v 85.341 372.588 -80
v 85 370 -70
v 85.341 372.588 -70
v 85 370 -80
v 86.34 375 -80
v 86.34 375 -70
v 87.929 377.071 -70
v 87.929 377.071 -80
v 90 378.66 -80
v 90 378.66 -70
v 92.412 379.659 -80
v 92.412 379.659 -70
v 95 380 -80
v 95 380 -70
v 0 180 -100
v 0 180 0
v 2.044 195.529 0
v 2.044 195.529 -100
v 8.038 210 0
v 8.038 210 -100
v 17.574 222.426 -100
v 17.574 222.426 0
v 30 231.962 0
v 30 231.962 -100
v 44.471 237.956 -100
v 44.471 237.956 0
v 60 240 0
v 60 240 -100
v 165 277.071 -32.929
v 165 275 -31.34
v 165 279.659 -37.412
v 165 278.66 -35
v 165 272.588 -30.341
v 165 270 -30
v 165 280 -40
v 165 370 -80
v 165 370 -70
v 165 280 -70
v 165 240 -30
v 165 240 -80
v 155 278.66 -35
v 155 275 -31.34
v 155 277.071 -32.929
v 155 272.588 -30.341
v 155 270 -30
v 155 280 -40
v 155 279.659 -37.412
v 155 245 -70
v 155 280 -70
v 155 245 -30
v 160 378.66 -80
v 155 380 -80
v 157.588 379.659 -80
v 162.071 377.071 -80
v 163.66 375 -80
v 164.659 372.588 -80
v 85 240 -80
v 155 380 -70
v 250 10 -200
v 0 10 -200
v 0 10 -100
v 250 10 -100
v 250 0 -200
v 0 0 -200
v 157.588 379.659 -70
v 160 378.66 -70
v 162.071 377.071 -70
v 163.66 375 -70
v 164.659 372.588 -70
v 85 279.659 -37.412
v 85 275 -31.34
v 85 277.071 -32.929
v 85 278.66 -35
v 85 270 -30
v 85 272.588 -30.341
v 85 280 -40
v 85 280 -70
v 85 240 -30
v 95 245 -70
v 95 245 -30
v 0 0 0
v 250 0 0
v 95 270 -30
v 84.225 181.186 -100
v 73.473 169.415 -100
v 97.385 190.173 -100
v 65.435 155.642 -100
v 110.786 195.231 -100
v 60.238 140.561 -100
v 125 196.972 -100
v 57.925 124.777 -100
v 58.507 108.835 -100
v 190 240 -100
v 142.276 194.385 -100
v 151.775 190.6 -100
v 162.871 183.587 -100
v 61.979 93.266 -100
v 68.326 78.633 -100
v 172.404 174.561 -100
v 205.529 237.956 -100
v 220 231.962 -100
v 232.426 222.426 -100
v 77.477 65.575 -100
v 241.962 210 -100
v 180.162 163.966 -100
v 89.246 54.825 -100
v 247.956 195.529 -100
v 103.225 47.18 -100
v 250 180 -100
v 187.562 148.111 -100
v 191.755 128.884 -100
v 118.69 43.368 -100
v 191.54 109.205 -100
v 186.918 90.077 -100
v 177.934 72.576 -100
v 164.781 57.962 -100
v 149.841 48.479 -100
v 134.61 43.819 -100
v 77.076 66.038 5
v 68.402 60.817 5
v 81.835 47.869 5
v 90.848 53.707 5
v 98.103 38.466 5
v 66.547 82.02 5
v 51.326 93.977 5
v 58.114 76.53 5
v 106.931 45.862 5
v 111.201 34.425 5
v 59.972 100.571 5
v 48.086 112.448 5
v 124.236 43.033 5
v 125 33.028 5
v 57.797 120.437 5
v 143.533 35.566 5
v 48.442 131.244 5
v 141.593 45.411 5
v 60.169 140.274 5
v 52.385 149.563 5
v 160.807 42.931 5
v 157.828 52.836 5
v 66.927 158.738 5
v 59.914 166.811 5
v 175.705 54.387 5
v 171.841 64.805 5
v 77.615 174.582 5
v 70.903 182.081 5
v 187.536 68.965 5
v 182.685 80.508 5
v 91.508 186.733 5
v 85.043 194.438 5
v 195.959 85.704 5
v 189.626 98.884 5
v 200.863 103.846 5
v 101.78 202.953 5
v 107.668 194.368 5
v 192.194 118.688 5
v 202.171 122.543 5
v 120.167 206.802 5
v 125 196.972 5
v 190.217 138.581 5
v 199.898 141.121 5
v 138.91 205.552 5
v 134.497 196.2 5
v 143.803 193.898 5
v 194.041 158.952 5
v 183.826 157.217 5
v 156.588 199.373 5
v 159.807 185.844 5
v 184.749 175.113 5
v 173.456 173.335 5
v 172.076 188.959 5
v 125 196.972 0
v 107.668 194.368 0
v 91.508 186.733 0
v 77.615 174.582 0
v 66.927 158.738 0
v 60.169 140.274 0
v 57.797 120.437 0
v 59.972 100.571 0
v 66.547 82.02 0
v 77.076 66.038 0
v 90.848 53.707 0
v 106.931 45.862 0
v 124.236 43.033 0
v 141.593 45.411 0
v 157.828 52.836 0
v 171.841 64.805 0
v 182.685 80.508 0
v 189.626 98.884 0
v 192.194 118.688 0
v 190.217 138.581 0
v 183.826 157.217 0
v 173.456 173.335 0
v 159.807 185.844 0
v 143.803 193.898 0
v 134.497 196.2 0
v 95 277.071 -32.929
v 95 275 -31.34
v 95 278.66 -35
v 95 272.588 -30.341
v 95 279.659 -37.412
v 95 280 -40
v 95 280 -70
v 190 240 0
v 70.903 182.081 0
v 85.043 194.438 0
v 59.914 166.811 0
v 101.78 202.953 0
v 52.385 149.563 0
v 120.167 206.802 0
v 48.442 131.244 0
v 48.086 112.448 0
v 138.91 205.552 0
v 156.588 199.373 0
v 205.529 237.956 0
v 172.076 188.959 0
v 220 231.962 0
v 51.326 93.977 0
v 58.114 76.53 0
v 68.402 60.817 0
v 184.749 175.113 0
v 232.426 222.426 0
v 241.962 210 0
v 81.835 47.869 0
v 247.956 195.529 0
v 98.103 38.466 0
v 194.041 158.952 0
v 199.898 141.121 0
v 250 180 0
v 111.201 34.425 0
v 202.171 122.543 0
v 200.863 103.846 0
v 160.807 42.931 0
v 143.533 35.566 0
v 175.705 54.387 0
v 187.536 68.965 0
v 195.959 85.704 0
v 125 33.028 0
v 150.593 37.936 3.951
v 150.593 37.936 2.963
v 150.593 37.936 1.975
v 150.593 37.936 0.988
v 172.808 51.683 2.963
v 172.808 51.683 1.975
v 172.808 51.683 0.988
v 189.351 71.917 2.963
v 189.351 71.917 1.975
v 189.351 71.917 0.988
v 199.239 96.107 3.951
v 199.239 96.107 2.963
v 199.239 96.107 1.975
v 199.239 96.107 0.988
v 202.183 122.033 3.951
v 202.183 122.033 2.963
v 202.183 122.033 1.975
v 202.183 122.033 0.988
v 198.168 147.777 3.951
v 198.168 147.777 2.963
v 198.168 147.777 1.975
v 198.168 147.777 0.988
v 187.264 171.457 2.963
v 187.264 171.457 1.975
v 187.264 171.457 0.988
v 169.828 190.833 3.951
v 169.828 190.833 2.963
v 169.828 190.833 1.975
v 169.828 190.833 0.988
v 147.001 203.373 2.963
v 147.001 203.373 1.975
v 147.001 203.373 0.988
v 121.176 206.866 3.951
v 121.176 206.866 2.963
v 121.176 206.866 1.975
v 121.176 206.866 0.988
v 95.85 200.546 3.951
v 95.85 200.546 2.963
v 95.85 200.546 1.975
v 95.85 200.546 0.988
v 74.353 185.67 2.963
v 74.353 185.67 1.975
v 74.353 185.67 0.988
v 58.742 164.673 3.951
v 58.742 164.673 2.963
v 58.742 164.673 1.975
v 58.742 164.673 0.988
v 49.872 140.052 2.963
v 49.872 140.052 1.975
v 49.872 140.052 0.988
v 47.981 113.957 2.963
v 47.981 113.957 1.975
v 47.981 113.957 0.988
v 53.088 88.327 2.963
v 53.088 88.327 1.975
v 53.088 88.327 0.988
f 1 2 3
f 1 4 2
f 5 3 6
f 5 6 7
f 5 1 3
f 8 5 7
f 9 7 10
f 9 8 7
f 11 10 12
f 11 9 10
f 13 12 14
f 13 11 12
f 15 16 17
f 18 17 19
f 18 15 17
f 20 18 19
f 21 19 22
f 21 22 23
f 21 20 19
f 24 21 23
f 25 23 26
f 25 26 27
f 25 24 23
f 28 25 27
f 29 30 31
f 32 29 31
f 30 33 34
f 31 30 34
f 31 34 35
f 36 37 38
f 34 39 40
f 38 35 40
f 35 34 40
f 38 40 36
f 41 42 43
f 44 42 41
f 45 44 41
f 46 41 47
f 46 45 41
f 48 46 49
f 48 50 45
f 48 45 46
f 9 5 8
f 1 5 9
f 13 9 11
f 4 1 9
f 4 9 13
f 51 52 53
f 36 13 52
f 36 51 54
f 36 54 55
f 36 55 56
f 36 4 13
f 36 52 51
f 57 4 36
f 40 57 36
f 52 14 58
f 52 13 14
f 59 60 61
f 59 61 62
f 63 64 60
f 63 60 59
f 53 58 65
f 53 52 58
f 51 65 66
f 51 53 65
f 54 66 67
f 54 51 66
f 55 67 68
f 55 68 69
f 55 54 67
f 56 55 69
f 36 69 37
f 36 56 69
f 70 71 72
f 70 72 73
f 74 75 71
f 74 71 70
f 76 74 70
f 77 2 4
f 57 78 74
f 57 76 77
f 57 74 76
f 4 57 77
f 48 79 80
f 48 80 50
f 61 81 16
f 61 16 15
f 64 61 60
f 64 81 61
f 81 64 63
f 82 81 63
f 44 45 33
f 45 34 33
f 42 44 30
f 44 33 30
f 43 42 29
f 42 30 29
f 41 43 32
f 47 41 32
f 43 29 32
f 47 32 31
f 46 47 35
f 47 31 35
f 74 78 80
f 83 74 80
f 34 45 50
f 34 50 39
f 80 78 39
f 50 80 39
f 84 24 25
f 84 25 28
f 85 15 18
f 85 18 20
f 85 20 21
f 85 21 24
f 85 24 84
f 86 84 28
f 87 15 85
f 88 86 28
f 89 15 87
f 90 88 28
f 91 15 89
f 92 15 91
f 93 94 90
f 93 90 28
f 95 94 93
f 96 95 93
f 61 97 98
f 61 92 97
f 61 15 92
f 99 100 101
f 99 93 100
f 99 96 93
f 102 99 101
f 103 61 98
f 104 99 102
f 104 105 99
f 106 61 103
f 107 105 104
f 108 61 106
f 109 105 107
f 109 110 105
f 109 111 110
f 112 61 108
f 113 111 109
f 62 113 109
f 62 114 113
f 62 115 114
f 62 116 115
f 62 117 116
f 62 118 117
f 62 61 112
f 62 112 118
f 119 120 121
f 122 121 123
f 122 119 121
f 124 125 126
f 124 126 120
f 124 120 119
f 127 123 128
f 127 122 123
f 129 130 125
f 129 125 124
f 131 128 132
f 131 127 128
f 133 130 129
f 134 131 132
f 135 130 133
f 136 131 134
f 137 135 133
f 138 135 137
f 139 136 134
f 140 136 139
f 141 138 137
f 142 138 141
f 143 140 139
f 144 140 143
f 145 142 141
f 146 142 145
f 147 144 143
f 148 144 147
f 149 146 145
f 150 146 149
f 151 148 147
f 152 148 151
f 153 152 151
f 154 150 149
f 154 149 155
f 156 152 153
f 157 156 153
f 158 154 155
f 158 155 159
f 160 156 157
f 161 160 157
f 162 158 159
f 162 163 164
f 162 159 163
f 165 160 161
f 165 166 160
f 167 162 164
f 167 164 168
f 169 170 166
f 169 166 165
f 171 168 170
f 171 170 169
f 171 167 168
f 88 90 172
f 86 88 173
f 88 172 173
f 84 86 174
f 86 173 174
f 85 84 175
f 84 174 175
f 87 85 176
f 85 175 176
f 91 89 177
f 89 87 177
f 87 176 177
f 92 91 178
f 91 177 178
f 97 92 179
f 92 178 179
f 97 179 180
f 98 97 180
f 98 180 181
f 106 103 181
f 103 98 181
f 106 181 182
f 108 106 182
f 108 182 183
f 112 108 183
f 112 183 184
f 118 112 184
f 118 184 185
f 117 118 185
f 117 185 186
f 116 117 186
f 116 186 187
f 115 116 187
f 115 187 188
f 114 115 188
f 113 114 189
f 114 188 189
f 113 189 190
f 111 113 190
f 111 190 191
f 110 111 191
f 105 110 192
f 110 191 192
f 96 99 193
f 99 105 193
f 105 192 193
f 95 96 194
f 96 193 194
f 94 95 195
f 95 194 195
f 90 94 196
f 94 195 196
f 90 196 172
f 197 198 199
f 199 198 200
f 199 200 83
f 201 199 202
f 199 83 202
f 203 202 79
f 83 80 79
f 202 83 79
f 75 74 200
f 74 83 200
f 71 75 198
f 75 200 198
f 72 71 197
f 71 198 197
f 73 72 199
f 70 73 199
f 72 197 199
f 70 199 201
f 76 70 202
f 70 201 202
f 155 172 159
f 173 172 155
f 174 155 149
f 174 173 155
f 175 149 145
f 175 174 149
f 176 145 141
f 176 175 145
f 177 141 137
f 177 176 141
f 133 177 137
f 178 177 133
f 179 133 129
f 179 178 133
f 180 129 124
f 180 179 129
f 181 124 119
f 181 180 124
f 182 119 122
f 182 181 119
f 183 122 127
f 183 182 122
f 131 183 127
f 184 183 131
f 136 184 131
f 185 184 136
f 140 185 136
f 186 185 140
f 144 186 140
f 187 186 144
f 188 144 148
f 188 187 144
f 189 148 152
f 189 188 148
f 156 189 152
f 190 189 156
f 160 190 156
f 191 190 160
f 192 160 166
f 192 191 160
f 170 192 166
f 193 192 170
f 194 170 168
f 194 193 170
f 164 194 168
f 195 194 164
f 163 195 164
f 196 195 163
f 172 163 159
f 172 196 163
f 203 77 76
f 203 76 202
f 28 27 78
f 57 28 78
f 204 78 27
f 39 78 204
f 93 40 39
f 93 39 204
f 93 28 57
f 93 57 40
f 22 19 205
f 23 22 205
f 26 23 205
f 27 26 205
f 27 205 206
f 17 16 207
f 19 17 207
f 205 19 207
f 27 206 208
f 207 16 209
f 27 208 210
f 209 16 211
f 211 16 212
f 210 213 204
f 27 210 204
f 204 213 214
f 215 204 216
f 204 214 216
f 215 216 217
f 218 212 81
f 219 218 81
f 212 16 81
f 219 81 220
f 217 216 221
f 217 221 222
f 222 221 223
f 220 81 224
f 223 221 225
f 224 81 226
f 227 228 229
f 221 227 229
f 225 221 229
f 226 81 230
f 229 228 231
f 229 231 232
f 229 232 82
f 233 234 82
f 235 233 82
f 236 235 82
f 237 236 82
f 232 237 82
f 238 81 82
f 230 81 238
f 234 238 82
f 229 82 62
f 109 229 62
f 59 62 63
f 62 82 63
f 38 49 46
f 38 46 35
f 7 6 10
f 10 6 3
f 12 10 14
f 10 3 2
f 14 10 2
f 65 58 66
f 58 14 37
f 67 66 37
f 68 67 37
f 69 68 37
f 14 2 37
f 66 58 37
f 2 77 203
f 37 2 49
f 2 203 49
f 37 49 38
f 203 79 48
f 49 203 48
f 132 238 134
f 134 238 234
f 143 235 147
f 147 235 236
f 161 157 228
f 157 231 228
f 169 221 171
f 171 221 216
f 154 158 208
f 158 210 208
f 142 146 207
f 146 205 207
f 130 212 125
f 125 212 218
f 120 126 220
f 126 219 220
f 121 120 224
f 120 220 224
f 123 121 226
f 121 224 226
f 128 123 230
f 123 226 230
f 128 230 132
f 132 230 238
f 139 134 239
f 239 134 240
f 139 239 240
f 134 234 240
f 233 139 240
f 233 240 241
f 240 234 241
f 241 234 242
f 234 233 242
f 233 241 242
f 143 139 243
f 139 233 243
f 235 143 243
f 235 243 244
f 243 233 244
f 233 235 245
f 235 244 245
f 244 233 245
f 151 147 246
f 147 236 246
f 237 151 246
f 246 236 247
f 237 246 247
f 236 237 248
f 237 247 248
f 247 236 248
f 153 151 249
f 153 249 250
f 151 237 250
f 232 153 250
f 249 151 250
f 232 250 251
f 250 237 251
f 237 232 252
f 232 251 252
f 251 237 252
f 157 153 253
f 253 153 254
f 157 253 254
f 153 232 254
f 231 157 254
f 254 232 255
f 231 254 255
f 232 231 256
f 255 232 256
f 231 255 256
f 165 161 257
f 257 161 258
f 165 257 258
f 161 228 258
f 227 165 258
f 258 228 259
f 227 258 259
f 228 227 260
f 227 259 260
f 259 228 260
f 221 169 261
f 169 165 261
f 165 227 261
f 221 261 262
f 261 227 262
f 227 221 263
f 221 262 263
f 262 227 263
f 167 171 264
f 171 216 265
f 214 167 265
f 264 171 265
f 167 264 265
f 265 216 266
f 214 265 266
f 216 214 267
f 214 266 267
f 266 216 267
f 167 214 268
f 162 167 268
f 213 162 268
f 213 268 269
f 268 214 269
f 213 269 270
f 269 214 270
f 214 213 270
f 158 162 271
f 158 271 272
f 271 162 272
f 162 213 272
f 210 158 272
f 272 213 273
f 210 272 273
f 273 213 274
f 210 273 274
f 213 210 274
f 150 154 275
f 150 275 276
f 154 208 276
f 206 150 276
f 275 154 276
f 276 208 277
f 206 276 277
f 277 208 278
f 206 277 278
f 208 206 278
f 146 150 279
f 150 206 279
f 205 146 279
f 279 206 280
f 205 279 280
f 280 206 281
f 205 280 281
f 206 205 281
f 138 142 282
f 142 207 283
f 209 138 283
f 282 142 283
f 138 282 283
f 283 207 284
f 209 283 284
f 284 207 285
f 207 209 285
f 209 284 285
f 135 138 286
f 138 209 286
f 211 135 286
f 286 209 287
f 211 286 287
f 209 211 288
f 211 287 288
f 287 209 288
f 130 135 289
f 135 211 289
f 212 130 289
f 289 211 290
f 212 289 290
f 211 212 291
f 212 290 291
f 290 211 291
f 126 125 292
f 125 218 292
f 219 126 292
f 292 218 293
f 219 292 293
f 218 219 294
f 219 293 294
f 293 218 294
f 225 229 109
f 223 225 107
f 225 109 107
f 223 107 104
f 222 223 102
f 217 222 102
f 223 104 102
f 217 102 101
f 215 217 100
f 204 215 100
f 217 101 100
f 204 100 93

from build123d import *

# Parameters (mm, degrees)
CROQUIS1_W              = 250
CROQUIS1_H              = 100
SALIENTE_EXTRUIR1_DEPTH = 240
CROQUIS1_3_W            = 250
CROQUIS1_3_H            = 100
SALIENTE_EXTRUIR2_DEPTH = 10
REDONDEO2_R             = 60
CROQUIS7_RX             = 76.972297538
CROQUIS7_RY             = 67.204239475
CORTAR_EXTRUIR4_DEPTH   = 143
CROQUIS8_RX             = 76.972297538
CROQUIS8_RY             = 67.204239475
SALIENTE_EXTRUIR3_DEPTH = 5
SALIENTE_EXTRUIR4_DEPTH = 140
CROQUIS10_4_W           = 60
CROQUIS10_4_H           = 40
SALIENTE_EXTRUIR5_DEPTH = 5
CROQUIS10_7_W           = 10
CROQUIS10_7_H           = 40
SALIENTE_EXTRUIR6_DEPTH = 40
REDONDEO3_R             = 10


with BuildPart() as part:
    # Croquis1 → Saliente-Extruir1 (new body)
    with BuildSketch(Plane(origin=(0, 0, 0), x_dir=(1, 0, 0), z_dir=(0, 1, 0))):
        with Locations((125, 50)):
            Rectangle(CROQUIS1_W, CROQUIS1_H)
    extrude(amount=SALIENTE_EXTRUIR1_DEPTH)

    # Croquis1<3> → Saliente-Extruir2 (add)
    with BuildSketch(Plane(origin=(0, 0, 0), x_dir=(1, 0, 0), z_dir=(0, 1, 0))):
        with Locations((125, 150)):
            Rectangle(CROQUIS1_3_W, CROQUIS1_3_H)
    extrude(amount=SALIENTE_EXTRUIR2_DEPTH)

    # Redondeo2
    redondeo2_edges = [part.edges().sort_by_distance(p)[0] for p in [
        (0, 240, -50),
        (250, 240, -50),
    ]]
    fillet(redondeo2_edges, radius=REDONDEO2_R)

    # Croquis7 → Cortar-Extruir4 (cut)
    with BuildSketch(Plane.XY):
        with Locations(Location((125, 120), (0, 0, 90))):
            Ellipse(CROQUIS7_RX, CROQUIS7_RY)
    extrude(amount=-CORTAR_EXTRUIR4_DEPTH, mode=Mode.SUBTRACT)

    # Croquis8 → Saliente-Extruir3 (add)
    with BuildSketch(Plane.XY):
        with BuildLine():
            add(Edge.make_bspline(
                [(125, 33.027702462), (127.716922997, 33.027702462), (130.404614336, 33.188438016), (135.724227666, 33.816566957), (138.356140016, 34.284013351), (143.564938997, 35.521474998), (146.141826175, 36.291487238), (149.32789788, 37.44666128), (149.963373673, 37.687404872), (151.222655871, 38.185011316), (151.847502015, 38.442239729), (153.70789977, 39.238771481), (154.929321189, 39.80290291), (158.538604748, 41.591903506), (160.871628277, 42.913129324), (165.395861295, 45.804761696), (167.58815404, 47.376066564), (171.826538699, 50.764218527), (173.840461698, 52.555062734), (177.671334874, 56.317817281), (179.488232347, 58.289776068), (182.931848653, 62.408514262), (184.558548159, 64.555311436), (186.856901598, 67.905760262), (187.596747198, 69.04071402), (189.017296342, 71.333449758), (189.6993083, 72.493124445), (192.971944449, 78.356200717), (195.154024171, 83.251956302), (197.358832322, 89.617795434), (197.773446154, 90.903439911), (198.549527035, 93.499465527), (198.90845874, 94.801347136), (199.900213511, 98.718294557), (200.448185039, 101.344637868), (201.763342829, 109.267362405), (202.204539447, 114.607070459), (202.204164292, 121.355053919), (202.176088659, 122.711265866), (202.064301478, 125.410452751), (201.980723301, 126.754629699), (201.648104971, 130.771139961), (201.317354659, 133.427486666), (200.000943496, 141.333104769), (198.694169349, 146.519550286), (196.490505918, 152.89104827), (196.019747164, 154.162853647), (195.025553036, 156.678150817), (194.502863938, 157.920234824), (192.858566532, 161.600125171), (191.660898436, 163.991673425), (187.761672007, 170.980079827), (184.75725411, 175.392744669), (180.875974654, 180.052106022), (180.437687128, 180.565534743), (179.546751621, 181.583658434), (179.09337423, 182.089135096), (177.717535309, 183.585353779), (176.779803074, 184.555633176), (173.905444326, 187.385345487), (171.907805387, 189.163850968), (167.748045081, 192.502690959), (165.585944795, 194.06305343), (161.090554052, 196.95671019), (158.757317239, 198.290075632), (155.72577479, 199.804250133), (155.112808717, 200.099822067), (153.88335661, 200.671549412), (153.266110917, 200.948114377), (151.406864587, 201.750096433), (150.157359681, 202.247819081), (146.379036893, 203.630980583), (143.820490433, 204.406706354), (138.623300542, 205.662560658), (135.98466882, 206.142732406), (132.634166248, 206.550255722), (131.96144789, 206.622099252), (130.610691005, 206.746152274), (129.93172719, 206.798392098), (127.900475049, 206.924426335), (126.55019563, 206.968001148), (122.510773219, 206.97998383), (119.833015326, 206.829969745), (114.507334656, 206.219611994), (111.859412215, 205.759264851), (107.910237087, 204.832541616), (106.593459447, 204.482838697), (103.994656921, 203.711410555), (102.711704261, 203.289784981), (98.91073308, 201.920359147), (96.440473583, 200.868288733), (91.623019608, 198.495465534), (89.275838057, 197.174684523), (85.847080779, 194.992620648), (84.71874619, 194.230876818), (82.517429794, 192.658127473), (81.441211058, 191.845169128), (78.283535549, 189.32908586), (76.27287878, 187.548949253), (72.432879578, 183.791453982), (70.603560889, 181.814069491), (67.99406522, 178.7017115), (67.145842384, 177.638458972), (65.509882594, 175.484104304), (64.72007818, 174.390671655), (62.432585129, 171.063111394), (61.016620532, 168.781834632), (58.394106502, 164.098462965), (57.187582612, 161.696353323), (55.532932124, 158.003686436), (55.007282323, 156.757854747), (54.007986074, 154.236189011), (53.536955939, 152.966840124), (51.326504906, 146.593244825), (50.011292376, 141.394042449), (48.68568488, 133.451947581), (48.35242998, 130.780535642), (48.017922664, 126.736804027), (47.934071147, 125.381056898), (47.82305979, 122.680583454), (47.7956054, 121.333200704), (47.79638432, 114.610332415), (48.235235275, 109.276623608), (49.552019564, 101.343057777), (50.101380969, 98.70977145), (51.097892129, 94.777389169), (51.459613379, 93.467418163), (52.234572443, 90.878122589), (52.64839956, 89.596085706), (54.84833069, 83.248504751), (57.023259968, 78.369066466), (60.932315801, 71.359424739), (62.343788817, 69.074787684), (64.633950857, 65.730613408), (65.428738625, 64.626504273), (67.06308957, 62.467122017), (67.902663487, 61.411404642), (70.488298836, 58.315872226), (72.301112731, 56.347504426), (76.107190252, 52.603909795), (78.100429201, 50.828656551), (82.275122661, 47.479603046), (84.456517338, 45.90573874), (87.309903664, 44.073958286), (87.887913061, 43.71382706), (89.049899878, 43.011672104), (89.634271423, 42.669355361), (91.39746439, 41.668541908), (92.5863576, 41.036165001), (96.193121975, 39.24298859), (98.65097198, 38.185868736), (103.674761223, 36.35194367), (106.240682844, 35.57509277), (110.174376905, 34.629763782), (111.499773132, 34.351388781), (114.179927084, 33.870783809), (115.524400715, 33.670430265), (118.219575281, 33.349651967), (119.570693495, 33.229152241), (121.602683565, 33.108421489), (122.280899507, 33.078186262), (123.639111575, 33.03782677), (124.320769251, 33.027702462), (125, 33.027702462)],
                knots=[0, 0, 0, 0, 0.015625, 0.015625, 0.03125, 0.03125, 0.046875, 0.046875, 0.05078125, 0.05078125, 0.0546875, 0.0546875, 0.0625, 0.0625, 0.078125, 0.078125, 0.09375, 0.09375, 0.109375, 0.109375, 0.125, 0.125, 0.140625, 0.140625, 0.1484375, 0.1484375, 0.15625, 0.15625, 0.1875, 0.1875, 0.1953125, 0.1953125, 0.203125, 0.203125, 0.21875, 0.21875, 0.25, 0.25, 0.2578125, 0.2578125, 0.265625, 0.265625, 0.28125, 0.28125, 0.3125, 0.3125, 0.3203125, 0.3203125, 0.328125, 0.328125, 0.34375, 0.34375, 0.375, 0.375, 0.37890625, 0.37890625, 0.3828125, 0.3828125, 0.390625, 0.390625, 0.40625, 0.40625, 0.421875, 0.421875, 0.4375, 0.4375, 0.44140625, 0.44140625, 0.4453125, 0.4453125, 0.453125, 0.453125, 0.46875, 0.46875, 0.484375, 0.484375, 0.48828125, 0.48828125, 0.4921875, 0.4921875, 0.5, 0.5, 0.515625, 0.515625, 0.53125, 0.53125, 0.5390625, 0.5390625, 0.546875, 0.546875, 0.5625, 0.5625, 0.578125, 0.578125, 0.5859375, 0.5859375, 0.59375, 0.59375, 0.609375, 0.609375, 0.625, 0.625, 0.6328125, 0.6328125, 0.640625, 0.640625, 0.65625, 0.65625, 0.671875, 0.671875, 0.6796875, 0.6796875, 0.6875, 0.6875, 0.71875, 0.71875, 0.734375, 0.734375, 0.7421875, 0.7421875, 0.75, 0.75, 0.78125, 0.78125, 0.796875, 0.796875, 0.8046875, 0.8046875, 0.8125, 0.8125, 0.84375, 0.84375, 0.859375, 0.859375, 0.8671875, 0.8671875, 0.875, 0.875, 0.890625, 0.890625, 0.90625, 0.90625, 0.921875, 0.921875, 0.92578125, 0.92578125, 0.9296875, 0.9296875, 0.9375, 0.9375, 0.953125, 0.953125, 0.96875, 0.96875, 0.9765625, 0.9765625, 0.984375, 0.984375, 0.9921875, 0.9921875, 0.99609375, 0.99609375, 1, 1, 1, 1], degree=3))
        make_face()
        with Locations(Location((125, 120), (0, 0, 90))):
            Ellipse(CROQUIS8_RX, CROQUIS8_RY, mode=Mode.SUBTRACT)
    extrude(amount=SALIENTE_EXTRUIR3_DEPTH)

    # Croquis10 → Saliente-Extruir4 (add)
    with BuildSketch(Plane(origin=(0, 240, 0), x_dir=(1, 0, 0), z_dir=(0, 1, 0))):
        Polygon((85, 80), (85, 70), (95, 70), (155, 70), (165, 70), (165, 80), align=None)
    extrude(amount=SALIENTE_EXTRUIR4_DEPTH)

    # Croquis10<4> → Saliente-Extruir5 (add)
    with BuildSketch(Plane(origin=(0, 240, 0), x_dir=(1, 0, 0), z_dir=(0, 1, 0))):
        with Locations((125, 50)):
            Rectangle(CROQUIS10_4_W, CROQUIS10_4_H)
    extrude(amount=SALIENTE_EXTRUIR5_DEPTH)

    # Croquis10<7> → Saliente-Extruir6 (add)
    with BuildSketch(Plane(origin=(0, 240, 0), x_dir=(1, 0, 0), z_dir=(0, 1, 0))):
        with Locations((90, 50)):
            Rectangle(CROQUIS10_7_W, CROQUIS10_7_H)
        with Locations((160, 50)):
            Rectangle(CROQUIS10_7_W, CROQUIS10_7_H)
    extrude(amount=SALIENTE_EXTRUIR6_DEPTH)

    # Redondeo3
    redondeo3_edges = [part.edges().sort_by_distance(p)[0] for p in [
        (90, 280, -30),
        (160, 280, -30),
        (85, 380, -75),
        (165, 380, -75),
    ]]
    fillet(redondeo3_edges, radius=REDONDEO3_R)


solid = part.part
